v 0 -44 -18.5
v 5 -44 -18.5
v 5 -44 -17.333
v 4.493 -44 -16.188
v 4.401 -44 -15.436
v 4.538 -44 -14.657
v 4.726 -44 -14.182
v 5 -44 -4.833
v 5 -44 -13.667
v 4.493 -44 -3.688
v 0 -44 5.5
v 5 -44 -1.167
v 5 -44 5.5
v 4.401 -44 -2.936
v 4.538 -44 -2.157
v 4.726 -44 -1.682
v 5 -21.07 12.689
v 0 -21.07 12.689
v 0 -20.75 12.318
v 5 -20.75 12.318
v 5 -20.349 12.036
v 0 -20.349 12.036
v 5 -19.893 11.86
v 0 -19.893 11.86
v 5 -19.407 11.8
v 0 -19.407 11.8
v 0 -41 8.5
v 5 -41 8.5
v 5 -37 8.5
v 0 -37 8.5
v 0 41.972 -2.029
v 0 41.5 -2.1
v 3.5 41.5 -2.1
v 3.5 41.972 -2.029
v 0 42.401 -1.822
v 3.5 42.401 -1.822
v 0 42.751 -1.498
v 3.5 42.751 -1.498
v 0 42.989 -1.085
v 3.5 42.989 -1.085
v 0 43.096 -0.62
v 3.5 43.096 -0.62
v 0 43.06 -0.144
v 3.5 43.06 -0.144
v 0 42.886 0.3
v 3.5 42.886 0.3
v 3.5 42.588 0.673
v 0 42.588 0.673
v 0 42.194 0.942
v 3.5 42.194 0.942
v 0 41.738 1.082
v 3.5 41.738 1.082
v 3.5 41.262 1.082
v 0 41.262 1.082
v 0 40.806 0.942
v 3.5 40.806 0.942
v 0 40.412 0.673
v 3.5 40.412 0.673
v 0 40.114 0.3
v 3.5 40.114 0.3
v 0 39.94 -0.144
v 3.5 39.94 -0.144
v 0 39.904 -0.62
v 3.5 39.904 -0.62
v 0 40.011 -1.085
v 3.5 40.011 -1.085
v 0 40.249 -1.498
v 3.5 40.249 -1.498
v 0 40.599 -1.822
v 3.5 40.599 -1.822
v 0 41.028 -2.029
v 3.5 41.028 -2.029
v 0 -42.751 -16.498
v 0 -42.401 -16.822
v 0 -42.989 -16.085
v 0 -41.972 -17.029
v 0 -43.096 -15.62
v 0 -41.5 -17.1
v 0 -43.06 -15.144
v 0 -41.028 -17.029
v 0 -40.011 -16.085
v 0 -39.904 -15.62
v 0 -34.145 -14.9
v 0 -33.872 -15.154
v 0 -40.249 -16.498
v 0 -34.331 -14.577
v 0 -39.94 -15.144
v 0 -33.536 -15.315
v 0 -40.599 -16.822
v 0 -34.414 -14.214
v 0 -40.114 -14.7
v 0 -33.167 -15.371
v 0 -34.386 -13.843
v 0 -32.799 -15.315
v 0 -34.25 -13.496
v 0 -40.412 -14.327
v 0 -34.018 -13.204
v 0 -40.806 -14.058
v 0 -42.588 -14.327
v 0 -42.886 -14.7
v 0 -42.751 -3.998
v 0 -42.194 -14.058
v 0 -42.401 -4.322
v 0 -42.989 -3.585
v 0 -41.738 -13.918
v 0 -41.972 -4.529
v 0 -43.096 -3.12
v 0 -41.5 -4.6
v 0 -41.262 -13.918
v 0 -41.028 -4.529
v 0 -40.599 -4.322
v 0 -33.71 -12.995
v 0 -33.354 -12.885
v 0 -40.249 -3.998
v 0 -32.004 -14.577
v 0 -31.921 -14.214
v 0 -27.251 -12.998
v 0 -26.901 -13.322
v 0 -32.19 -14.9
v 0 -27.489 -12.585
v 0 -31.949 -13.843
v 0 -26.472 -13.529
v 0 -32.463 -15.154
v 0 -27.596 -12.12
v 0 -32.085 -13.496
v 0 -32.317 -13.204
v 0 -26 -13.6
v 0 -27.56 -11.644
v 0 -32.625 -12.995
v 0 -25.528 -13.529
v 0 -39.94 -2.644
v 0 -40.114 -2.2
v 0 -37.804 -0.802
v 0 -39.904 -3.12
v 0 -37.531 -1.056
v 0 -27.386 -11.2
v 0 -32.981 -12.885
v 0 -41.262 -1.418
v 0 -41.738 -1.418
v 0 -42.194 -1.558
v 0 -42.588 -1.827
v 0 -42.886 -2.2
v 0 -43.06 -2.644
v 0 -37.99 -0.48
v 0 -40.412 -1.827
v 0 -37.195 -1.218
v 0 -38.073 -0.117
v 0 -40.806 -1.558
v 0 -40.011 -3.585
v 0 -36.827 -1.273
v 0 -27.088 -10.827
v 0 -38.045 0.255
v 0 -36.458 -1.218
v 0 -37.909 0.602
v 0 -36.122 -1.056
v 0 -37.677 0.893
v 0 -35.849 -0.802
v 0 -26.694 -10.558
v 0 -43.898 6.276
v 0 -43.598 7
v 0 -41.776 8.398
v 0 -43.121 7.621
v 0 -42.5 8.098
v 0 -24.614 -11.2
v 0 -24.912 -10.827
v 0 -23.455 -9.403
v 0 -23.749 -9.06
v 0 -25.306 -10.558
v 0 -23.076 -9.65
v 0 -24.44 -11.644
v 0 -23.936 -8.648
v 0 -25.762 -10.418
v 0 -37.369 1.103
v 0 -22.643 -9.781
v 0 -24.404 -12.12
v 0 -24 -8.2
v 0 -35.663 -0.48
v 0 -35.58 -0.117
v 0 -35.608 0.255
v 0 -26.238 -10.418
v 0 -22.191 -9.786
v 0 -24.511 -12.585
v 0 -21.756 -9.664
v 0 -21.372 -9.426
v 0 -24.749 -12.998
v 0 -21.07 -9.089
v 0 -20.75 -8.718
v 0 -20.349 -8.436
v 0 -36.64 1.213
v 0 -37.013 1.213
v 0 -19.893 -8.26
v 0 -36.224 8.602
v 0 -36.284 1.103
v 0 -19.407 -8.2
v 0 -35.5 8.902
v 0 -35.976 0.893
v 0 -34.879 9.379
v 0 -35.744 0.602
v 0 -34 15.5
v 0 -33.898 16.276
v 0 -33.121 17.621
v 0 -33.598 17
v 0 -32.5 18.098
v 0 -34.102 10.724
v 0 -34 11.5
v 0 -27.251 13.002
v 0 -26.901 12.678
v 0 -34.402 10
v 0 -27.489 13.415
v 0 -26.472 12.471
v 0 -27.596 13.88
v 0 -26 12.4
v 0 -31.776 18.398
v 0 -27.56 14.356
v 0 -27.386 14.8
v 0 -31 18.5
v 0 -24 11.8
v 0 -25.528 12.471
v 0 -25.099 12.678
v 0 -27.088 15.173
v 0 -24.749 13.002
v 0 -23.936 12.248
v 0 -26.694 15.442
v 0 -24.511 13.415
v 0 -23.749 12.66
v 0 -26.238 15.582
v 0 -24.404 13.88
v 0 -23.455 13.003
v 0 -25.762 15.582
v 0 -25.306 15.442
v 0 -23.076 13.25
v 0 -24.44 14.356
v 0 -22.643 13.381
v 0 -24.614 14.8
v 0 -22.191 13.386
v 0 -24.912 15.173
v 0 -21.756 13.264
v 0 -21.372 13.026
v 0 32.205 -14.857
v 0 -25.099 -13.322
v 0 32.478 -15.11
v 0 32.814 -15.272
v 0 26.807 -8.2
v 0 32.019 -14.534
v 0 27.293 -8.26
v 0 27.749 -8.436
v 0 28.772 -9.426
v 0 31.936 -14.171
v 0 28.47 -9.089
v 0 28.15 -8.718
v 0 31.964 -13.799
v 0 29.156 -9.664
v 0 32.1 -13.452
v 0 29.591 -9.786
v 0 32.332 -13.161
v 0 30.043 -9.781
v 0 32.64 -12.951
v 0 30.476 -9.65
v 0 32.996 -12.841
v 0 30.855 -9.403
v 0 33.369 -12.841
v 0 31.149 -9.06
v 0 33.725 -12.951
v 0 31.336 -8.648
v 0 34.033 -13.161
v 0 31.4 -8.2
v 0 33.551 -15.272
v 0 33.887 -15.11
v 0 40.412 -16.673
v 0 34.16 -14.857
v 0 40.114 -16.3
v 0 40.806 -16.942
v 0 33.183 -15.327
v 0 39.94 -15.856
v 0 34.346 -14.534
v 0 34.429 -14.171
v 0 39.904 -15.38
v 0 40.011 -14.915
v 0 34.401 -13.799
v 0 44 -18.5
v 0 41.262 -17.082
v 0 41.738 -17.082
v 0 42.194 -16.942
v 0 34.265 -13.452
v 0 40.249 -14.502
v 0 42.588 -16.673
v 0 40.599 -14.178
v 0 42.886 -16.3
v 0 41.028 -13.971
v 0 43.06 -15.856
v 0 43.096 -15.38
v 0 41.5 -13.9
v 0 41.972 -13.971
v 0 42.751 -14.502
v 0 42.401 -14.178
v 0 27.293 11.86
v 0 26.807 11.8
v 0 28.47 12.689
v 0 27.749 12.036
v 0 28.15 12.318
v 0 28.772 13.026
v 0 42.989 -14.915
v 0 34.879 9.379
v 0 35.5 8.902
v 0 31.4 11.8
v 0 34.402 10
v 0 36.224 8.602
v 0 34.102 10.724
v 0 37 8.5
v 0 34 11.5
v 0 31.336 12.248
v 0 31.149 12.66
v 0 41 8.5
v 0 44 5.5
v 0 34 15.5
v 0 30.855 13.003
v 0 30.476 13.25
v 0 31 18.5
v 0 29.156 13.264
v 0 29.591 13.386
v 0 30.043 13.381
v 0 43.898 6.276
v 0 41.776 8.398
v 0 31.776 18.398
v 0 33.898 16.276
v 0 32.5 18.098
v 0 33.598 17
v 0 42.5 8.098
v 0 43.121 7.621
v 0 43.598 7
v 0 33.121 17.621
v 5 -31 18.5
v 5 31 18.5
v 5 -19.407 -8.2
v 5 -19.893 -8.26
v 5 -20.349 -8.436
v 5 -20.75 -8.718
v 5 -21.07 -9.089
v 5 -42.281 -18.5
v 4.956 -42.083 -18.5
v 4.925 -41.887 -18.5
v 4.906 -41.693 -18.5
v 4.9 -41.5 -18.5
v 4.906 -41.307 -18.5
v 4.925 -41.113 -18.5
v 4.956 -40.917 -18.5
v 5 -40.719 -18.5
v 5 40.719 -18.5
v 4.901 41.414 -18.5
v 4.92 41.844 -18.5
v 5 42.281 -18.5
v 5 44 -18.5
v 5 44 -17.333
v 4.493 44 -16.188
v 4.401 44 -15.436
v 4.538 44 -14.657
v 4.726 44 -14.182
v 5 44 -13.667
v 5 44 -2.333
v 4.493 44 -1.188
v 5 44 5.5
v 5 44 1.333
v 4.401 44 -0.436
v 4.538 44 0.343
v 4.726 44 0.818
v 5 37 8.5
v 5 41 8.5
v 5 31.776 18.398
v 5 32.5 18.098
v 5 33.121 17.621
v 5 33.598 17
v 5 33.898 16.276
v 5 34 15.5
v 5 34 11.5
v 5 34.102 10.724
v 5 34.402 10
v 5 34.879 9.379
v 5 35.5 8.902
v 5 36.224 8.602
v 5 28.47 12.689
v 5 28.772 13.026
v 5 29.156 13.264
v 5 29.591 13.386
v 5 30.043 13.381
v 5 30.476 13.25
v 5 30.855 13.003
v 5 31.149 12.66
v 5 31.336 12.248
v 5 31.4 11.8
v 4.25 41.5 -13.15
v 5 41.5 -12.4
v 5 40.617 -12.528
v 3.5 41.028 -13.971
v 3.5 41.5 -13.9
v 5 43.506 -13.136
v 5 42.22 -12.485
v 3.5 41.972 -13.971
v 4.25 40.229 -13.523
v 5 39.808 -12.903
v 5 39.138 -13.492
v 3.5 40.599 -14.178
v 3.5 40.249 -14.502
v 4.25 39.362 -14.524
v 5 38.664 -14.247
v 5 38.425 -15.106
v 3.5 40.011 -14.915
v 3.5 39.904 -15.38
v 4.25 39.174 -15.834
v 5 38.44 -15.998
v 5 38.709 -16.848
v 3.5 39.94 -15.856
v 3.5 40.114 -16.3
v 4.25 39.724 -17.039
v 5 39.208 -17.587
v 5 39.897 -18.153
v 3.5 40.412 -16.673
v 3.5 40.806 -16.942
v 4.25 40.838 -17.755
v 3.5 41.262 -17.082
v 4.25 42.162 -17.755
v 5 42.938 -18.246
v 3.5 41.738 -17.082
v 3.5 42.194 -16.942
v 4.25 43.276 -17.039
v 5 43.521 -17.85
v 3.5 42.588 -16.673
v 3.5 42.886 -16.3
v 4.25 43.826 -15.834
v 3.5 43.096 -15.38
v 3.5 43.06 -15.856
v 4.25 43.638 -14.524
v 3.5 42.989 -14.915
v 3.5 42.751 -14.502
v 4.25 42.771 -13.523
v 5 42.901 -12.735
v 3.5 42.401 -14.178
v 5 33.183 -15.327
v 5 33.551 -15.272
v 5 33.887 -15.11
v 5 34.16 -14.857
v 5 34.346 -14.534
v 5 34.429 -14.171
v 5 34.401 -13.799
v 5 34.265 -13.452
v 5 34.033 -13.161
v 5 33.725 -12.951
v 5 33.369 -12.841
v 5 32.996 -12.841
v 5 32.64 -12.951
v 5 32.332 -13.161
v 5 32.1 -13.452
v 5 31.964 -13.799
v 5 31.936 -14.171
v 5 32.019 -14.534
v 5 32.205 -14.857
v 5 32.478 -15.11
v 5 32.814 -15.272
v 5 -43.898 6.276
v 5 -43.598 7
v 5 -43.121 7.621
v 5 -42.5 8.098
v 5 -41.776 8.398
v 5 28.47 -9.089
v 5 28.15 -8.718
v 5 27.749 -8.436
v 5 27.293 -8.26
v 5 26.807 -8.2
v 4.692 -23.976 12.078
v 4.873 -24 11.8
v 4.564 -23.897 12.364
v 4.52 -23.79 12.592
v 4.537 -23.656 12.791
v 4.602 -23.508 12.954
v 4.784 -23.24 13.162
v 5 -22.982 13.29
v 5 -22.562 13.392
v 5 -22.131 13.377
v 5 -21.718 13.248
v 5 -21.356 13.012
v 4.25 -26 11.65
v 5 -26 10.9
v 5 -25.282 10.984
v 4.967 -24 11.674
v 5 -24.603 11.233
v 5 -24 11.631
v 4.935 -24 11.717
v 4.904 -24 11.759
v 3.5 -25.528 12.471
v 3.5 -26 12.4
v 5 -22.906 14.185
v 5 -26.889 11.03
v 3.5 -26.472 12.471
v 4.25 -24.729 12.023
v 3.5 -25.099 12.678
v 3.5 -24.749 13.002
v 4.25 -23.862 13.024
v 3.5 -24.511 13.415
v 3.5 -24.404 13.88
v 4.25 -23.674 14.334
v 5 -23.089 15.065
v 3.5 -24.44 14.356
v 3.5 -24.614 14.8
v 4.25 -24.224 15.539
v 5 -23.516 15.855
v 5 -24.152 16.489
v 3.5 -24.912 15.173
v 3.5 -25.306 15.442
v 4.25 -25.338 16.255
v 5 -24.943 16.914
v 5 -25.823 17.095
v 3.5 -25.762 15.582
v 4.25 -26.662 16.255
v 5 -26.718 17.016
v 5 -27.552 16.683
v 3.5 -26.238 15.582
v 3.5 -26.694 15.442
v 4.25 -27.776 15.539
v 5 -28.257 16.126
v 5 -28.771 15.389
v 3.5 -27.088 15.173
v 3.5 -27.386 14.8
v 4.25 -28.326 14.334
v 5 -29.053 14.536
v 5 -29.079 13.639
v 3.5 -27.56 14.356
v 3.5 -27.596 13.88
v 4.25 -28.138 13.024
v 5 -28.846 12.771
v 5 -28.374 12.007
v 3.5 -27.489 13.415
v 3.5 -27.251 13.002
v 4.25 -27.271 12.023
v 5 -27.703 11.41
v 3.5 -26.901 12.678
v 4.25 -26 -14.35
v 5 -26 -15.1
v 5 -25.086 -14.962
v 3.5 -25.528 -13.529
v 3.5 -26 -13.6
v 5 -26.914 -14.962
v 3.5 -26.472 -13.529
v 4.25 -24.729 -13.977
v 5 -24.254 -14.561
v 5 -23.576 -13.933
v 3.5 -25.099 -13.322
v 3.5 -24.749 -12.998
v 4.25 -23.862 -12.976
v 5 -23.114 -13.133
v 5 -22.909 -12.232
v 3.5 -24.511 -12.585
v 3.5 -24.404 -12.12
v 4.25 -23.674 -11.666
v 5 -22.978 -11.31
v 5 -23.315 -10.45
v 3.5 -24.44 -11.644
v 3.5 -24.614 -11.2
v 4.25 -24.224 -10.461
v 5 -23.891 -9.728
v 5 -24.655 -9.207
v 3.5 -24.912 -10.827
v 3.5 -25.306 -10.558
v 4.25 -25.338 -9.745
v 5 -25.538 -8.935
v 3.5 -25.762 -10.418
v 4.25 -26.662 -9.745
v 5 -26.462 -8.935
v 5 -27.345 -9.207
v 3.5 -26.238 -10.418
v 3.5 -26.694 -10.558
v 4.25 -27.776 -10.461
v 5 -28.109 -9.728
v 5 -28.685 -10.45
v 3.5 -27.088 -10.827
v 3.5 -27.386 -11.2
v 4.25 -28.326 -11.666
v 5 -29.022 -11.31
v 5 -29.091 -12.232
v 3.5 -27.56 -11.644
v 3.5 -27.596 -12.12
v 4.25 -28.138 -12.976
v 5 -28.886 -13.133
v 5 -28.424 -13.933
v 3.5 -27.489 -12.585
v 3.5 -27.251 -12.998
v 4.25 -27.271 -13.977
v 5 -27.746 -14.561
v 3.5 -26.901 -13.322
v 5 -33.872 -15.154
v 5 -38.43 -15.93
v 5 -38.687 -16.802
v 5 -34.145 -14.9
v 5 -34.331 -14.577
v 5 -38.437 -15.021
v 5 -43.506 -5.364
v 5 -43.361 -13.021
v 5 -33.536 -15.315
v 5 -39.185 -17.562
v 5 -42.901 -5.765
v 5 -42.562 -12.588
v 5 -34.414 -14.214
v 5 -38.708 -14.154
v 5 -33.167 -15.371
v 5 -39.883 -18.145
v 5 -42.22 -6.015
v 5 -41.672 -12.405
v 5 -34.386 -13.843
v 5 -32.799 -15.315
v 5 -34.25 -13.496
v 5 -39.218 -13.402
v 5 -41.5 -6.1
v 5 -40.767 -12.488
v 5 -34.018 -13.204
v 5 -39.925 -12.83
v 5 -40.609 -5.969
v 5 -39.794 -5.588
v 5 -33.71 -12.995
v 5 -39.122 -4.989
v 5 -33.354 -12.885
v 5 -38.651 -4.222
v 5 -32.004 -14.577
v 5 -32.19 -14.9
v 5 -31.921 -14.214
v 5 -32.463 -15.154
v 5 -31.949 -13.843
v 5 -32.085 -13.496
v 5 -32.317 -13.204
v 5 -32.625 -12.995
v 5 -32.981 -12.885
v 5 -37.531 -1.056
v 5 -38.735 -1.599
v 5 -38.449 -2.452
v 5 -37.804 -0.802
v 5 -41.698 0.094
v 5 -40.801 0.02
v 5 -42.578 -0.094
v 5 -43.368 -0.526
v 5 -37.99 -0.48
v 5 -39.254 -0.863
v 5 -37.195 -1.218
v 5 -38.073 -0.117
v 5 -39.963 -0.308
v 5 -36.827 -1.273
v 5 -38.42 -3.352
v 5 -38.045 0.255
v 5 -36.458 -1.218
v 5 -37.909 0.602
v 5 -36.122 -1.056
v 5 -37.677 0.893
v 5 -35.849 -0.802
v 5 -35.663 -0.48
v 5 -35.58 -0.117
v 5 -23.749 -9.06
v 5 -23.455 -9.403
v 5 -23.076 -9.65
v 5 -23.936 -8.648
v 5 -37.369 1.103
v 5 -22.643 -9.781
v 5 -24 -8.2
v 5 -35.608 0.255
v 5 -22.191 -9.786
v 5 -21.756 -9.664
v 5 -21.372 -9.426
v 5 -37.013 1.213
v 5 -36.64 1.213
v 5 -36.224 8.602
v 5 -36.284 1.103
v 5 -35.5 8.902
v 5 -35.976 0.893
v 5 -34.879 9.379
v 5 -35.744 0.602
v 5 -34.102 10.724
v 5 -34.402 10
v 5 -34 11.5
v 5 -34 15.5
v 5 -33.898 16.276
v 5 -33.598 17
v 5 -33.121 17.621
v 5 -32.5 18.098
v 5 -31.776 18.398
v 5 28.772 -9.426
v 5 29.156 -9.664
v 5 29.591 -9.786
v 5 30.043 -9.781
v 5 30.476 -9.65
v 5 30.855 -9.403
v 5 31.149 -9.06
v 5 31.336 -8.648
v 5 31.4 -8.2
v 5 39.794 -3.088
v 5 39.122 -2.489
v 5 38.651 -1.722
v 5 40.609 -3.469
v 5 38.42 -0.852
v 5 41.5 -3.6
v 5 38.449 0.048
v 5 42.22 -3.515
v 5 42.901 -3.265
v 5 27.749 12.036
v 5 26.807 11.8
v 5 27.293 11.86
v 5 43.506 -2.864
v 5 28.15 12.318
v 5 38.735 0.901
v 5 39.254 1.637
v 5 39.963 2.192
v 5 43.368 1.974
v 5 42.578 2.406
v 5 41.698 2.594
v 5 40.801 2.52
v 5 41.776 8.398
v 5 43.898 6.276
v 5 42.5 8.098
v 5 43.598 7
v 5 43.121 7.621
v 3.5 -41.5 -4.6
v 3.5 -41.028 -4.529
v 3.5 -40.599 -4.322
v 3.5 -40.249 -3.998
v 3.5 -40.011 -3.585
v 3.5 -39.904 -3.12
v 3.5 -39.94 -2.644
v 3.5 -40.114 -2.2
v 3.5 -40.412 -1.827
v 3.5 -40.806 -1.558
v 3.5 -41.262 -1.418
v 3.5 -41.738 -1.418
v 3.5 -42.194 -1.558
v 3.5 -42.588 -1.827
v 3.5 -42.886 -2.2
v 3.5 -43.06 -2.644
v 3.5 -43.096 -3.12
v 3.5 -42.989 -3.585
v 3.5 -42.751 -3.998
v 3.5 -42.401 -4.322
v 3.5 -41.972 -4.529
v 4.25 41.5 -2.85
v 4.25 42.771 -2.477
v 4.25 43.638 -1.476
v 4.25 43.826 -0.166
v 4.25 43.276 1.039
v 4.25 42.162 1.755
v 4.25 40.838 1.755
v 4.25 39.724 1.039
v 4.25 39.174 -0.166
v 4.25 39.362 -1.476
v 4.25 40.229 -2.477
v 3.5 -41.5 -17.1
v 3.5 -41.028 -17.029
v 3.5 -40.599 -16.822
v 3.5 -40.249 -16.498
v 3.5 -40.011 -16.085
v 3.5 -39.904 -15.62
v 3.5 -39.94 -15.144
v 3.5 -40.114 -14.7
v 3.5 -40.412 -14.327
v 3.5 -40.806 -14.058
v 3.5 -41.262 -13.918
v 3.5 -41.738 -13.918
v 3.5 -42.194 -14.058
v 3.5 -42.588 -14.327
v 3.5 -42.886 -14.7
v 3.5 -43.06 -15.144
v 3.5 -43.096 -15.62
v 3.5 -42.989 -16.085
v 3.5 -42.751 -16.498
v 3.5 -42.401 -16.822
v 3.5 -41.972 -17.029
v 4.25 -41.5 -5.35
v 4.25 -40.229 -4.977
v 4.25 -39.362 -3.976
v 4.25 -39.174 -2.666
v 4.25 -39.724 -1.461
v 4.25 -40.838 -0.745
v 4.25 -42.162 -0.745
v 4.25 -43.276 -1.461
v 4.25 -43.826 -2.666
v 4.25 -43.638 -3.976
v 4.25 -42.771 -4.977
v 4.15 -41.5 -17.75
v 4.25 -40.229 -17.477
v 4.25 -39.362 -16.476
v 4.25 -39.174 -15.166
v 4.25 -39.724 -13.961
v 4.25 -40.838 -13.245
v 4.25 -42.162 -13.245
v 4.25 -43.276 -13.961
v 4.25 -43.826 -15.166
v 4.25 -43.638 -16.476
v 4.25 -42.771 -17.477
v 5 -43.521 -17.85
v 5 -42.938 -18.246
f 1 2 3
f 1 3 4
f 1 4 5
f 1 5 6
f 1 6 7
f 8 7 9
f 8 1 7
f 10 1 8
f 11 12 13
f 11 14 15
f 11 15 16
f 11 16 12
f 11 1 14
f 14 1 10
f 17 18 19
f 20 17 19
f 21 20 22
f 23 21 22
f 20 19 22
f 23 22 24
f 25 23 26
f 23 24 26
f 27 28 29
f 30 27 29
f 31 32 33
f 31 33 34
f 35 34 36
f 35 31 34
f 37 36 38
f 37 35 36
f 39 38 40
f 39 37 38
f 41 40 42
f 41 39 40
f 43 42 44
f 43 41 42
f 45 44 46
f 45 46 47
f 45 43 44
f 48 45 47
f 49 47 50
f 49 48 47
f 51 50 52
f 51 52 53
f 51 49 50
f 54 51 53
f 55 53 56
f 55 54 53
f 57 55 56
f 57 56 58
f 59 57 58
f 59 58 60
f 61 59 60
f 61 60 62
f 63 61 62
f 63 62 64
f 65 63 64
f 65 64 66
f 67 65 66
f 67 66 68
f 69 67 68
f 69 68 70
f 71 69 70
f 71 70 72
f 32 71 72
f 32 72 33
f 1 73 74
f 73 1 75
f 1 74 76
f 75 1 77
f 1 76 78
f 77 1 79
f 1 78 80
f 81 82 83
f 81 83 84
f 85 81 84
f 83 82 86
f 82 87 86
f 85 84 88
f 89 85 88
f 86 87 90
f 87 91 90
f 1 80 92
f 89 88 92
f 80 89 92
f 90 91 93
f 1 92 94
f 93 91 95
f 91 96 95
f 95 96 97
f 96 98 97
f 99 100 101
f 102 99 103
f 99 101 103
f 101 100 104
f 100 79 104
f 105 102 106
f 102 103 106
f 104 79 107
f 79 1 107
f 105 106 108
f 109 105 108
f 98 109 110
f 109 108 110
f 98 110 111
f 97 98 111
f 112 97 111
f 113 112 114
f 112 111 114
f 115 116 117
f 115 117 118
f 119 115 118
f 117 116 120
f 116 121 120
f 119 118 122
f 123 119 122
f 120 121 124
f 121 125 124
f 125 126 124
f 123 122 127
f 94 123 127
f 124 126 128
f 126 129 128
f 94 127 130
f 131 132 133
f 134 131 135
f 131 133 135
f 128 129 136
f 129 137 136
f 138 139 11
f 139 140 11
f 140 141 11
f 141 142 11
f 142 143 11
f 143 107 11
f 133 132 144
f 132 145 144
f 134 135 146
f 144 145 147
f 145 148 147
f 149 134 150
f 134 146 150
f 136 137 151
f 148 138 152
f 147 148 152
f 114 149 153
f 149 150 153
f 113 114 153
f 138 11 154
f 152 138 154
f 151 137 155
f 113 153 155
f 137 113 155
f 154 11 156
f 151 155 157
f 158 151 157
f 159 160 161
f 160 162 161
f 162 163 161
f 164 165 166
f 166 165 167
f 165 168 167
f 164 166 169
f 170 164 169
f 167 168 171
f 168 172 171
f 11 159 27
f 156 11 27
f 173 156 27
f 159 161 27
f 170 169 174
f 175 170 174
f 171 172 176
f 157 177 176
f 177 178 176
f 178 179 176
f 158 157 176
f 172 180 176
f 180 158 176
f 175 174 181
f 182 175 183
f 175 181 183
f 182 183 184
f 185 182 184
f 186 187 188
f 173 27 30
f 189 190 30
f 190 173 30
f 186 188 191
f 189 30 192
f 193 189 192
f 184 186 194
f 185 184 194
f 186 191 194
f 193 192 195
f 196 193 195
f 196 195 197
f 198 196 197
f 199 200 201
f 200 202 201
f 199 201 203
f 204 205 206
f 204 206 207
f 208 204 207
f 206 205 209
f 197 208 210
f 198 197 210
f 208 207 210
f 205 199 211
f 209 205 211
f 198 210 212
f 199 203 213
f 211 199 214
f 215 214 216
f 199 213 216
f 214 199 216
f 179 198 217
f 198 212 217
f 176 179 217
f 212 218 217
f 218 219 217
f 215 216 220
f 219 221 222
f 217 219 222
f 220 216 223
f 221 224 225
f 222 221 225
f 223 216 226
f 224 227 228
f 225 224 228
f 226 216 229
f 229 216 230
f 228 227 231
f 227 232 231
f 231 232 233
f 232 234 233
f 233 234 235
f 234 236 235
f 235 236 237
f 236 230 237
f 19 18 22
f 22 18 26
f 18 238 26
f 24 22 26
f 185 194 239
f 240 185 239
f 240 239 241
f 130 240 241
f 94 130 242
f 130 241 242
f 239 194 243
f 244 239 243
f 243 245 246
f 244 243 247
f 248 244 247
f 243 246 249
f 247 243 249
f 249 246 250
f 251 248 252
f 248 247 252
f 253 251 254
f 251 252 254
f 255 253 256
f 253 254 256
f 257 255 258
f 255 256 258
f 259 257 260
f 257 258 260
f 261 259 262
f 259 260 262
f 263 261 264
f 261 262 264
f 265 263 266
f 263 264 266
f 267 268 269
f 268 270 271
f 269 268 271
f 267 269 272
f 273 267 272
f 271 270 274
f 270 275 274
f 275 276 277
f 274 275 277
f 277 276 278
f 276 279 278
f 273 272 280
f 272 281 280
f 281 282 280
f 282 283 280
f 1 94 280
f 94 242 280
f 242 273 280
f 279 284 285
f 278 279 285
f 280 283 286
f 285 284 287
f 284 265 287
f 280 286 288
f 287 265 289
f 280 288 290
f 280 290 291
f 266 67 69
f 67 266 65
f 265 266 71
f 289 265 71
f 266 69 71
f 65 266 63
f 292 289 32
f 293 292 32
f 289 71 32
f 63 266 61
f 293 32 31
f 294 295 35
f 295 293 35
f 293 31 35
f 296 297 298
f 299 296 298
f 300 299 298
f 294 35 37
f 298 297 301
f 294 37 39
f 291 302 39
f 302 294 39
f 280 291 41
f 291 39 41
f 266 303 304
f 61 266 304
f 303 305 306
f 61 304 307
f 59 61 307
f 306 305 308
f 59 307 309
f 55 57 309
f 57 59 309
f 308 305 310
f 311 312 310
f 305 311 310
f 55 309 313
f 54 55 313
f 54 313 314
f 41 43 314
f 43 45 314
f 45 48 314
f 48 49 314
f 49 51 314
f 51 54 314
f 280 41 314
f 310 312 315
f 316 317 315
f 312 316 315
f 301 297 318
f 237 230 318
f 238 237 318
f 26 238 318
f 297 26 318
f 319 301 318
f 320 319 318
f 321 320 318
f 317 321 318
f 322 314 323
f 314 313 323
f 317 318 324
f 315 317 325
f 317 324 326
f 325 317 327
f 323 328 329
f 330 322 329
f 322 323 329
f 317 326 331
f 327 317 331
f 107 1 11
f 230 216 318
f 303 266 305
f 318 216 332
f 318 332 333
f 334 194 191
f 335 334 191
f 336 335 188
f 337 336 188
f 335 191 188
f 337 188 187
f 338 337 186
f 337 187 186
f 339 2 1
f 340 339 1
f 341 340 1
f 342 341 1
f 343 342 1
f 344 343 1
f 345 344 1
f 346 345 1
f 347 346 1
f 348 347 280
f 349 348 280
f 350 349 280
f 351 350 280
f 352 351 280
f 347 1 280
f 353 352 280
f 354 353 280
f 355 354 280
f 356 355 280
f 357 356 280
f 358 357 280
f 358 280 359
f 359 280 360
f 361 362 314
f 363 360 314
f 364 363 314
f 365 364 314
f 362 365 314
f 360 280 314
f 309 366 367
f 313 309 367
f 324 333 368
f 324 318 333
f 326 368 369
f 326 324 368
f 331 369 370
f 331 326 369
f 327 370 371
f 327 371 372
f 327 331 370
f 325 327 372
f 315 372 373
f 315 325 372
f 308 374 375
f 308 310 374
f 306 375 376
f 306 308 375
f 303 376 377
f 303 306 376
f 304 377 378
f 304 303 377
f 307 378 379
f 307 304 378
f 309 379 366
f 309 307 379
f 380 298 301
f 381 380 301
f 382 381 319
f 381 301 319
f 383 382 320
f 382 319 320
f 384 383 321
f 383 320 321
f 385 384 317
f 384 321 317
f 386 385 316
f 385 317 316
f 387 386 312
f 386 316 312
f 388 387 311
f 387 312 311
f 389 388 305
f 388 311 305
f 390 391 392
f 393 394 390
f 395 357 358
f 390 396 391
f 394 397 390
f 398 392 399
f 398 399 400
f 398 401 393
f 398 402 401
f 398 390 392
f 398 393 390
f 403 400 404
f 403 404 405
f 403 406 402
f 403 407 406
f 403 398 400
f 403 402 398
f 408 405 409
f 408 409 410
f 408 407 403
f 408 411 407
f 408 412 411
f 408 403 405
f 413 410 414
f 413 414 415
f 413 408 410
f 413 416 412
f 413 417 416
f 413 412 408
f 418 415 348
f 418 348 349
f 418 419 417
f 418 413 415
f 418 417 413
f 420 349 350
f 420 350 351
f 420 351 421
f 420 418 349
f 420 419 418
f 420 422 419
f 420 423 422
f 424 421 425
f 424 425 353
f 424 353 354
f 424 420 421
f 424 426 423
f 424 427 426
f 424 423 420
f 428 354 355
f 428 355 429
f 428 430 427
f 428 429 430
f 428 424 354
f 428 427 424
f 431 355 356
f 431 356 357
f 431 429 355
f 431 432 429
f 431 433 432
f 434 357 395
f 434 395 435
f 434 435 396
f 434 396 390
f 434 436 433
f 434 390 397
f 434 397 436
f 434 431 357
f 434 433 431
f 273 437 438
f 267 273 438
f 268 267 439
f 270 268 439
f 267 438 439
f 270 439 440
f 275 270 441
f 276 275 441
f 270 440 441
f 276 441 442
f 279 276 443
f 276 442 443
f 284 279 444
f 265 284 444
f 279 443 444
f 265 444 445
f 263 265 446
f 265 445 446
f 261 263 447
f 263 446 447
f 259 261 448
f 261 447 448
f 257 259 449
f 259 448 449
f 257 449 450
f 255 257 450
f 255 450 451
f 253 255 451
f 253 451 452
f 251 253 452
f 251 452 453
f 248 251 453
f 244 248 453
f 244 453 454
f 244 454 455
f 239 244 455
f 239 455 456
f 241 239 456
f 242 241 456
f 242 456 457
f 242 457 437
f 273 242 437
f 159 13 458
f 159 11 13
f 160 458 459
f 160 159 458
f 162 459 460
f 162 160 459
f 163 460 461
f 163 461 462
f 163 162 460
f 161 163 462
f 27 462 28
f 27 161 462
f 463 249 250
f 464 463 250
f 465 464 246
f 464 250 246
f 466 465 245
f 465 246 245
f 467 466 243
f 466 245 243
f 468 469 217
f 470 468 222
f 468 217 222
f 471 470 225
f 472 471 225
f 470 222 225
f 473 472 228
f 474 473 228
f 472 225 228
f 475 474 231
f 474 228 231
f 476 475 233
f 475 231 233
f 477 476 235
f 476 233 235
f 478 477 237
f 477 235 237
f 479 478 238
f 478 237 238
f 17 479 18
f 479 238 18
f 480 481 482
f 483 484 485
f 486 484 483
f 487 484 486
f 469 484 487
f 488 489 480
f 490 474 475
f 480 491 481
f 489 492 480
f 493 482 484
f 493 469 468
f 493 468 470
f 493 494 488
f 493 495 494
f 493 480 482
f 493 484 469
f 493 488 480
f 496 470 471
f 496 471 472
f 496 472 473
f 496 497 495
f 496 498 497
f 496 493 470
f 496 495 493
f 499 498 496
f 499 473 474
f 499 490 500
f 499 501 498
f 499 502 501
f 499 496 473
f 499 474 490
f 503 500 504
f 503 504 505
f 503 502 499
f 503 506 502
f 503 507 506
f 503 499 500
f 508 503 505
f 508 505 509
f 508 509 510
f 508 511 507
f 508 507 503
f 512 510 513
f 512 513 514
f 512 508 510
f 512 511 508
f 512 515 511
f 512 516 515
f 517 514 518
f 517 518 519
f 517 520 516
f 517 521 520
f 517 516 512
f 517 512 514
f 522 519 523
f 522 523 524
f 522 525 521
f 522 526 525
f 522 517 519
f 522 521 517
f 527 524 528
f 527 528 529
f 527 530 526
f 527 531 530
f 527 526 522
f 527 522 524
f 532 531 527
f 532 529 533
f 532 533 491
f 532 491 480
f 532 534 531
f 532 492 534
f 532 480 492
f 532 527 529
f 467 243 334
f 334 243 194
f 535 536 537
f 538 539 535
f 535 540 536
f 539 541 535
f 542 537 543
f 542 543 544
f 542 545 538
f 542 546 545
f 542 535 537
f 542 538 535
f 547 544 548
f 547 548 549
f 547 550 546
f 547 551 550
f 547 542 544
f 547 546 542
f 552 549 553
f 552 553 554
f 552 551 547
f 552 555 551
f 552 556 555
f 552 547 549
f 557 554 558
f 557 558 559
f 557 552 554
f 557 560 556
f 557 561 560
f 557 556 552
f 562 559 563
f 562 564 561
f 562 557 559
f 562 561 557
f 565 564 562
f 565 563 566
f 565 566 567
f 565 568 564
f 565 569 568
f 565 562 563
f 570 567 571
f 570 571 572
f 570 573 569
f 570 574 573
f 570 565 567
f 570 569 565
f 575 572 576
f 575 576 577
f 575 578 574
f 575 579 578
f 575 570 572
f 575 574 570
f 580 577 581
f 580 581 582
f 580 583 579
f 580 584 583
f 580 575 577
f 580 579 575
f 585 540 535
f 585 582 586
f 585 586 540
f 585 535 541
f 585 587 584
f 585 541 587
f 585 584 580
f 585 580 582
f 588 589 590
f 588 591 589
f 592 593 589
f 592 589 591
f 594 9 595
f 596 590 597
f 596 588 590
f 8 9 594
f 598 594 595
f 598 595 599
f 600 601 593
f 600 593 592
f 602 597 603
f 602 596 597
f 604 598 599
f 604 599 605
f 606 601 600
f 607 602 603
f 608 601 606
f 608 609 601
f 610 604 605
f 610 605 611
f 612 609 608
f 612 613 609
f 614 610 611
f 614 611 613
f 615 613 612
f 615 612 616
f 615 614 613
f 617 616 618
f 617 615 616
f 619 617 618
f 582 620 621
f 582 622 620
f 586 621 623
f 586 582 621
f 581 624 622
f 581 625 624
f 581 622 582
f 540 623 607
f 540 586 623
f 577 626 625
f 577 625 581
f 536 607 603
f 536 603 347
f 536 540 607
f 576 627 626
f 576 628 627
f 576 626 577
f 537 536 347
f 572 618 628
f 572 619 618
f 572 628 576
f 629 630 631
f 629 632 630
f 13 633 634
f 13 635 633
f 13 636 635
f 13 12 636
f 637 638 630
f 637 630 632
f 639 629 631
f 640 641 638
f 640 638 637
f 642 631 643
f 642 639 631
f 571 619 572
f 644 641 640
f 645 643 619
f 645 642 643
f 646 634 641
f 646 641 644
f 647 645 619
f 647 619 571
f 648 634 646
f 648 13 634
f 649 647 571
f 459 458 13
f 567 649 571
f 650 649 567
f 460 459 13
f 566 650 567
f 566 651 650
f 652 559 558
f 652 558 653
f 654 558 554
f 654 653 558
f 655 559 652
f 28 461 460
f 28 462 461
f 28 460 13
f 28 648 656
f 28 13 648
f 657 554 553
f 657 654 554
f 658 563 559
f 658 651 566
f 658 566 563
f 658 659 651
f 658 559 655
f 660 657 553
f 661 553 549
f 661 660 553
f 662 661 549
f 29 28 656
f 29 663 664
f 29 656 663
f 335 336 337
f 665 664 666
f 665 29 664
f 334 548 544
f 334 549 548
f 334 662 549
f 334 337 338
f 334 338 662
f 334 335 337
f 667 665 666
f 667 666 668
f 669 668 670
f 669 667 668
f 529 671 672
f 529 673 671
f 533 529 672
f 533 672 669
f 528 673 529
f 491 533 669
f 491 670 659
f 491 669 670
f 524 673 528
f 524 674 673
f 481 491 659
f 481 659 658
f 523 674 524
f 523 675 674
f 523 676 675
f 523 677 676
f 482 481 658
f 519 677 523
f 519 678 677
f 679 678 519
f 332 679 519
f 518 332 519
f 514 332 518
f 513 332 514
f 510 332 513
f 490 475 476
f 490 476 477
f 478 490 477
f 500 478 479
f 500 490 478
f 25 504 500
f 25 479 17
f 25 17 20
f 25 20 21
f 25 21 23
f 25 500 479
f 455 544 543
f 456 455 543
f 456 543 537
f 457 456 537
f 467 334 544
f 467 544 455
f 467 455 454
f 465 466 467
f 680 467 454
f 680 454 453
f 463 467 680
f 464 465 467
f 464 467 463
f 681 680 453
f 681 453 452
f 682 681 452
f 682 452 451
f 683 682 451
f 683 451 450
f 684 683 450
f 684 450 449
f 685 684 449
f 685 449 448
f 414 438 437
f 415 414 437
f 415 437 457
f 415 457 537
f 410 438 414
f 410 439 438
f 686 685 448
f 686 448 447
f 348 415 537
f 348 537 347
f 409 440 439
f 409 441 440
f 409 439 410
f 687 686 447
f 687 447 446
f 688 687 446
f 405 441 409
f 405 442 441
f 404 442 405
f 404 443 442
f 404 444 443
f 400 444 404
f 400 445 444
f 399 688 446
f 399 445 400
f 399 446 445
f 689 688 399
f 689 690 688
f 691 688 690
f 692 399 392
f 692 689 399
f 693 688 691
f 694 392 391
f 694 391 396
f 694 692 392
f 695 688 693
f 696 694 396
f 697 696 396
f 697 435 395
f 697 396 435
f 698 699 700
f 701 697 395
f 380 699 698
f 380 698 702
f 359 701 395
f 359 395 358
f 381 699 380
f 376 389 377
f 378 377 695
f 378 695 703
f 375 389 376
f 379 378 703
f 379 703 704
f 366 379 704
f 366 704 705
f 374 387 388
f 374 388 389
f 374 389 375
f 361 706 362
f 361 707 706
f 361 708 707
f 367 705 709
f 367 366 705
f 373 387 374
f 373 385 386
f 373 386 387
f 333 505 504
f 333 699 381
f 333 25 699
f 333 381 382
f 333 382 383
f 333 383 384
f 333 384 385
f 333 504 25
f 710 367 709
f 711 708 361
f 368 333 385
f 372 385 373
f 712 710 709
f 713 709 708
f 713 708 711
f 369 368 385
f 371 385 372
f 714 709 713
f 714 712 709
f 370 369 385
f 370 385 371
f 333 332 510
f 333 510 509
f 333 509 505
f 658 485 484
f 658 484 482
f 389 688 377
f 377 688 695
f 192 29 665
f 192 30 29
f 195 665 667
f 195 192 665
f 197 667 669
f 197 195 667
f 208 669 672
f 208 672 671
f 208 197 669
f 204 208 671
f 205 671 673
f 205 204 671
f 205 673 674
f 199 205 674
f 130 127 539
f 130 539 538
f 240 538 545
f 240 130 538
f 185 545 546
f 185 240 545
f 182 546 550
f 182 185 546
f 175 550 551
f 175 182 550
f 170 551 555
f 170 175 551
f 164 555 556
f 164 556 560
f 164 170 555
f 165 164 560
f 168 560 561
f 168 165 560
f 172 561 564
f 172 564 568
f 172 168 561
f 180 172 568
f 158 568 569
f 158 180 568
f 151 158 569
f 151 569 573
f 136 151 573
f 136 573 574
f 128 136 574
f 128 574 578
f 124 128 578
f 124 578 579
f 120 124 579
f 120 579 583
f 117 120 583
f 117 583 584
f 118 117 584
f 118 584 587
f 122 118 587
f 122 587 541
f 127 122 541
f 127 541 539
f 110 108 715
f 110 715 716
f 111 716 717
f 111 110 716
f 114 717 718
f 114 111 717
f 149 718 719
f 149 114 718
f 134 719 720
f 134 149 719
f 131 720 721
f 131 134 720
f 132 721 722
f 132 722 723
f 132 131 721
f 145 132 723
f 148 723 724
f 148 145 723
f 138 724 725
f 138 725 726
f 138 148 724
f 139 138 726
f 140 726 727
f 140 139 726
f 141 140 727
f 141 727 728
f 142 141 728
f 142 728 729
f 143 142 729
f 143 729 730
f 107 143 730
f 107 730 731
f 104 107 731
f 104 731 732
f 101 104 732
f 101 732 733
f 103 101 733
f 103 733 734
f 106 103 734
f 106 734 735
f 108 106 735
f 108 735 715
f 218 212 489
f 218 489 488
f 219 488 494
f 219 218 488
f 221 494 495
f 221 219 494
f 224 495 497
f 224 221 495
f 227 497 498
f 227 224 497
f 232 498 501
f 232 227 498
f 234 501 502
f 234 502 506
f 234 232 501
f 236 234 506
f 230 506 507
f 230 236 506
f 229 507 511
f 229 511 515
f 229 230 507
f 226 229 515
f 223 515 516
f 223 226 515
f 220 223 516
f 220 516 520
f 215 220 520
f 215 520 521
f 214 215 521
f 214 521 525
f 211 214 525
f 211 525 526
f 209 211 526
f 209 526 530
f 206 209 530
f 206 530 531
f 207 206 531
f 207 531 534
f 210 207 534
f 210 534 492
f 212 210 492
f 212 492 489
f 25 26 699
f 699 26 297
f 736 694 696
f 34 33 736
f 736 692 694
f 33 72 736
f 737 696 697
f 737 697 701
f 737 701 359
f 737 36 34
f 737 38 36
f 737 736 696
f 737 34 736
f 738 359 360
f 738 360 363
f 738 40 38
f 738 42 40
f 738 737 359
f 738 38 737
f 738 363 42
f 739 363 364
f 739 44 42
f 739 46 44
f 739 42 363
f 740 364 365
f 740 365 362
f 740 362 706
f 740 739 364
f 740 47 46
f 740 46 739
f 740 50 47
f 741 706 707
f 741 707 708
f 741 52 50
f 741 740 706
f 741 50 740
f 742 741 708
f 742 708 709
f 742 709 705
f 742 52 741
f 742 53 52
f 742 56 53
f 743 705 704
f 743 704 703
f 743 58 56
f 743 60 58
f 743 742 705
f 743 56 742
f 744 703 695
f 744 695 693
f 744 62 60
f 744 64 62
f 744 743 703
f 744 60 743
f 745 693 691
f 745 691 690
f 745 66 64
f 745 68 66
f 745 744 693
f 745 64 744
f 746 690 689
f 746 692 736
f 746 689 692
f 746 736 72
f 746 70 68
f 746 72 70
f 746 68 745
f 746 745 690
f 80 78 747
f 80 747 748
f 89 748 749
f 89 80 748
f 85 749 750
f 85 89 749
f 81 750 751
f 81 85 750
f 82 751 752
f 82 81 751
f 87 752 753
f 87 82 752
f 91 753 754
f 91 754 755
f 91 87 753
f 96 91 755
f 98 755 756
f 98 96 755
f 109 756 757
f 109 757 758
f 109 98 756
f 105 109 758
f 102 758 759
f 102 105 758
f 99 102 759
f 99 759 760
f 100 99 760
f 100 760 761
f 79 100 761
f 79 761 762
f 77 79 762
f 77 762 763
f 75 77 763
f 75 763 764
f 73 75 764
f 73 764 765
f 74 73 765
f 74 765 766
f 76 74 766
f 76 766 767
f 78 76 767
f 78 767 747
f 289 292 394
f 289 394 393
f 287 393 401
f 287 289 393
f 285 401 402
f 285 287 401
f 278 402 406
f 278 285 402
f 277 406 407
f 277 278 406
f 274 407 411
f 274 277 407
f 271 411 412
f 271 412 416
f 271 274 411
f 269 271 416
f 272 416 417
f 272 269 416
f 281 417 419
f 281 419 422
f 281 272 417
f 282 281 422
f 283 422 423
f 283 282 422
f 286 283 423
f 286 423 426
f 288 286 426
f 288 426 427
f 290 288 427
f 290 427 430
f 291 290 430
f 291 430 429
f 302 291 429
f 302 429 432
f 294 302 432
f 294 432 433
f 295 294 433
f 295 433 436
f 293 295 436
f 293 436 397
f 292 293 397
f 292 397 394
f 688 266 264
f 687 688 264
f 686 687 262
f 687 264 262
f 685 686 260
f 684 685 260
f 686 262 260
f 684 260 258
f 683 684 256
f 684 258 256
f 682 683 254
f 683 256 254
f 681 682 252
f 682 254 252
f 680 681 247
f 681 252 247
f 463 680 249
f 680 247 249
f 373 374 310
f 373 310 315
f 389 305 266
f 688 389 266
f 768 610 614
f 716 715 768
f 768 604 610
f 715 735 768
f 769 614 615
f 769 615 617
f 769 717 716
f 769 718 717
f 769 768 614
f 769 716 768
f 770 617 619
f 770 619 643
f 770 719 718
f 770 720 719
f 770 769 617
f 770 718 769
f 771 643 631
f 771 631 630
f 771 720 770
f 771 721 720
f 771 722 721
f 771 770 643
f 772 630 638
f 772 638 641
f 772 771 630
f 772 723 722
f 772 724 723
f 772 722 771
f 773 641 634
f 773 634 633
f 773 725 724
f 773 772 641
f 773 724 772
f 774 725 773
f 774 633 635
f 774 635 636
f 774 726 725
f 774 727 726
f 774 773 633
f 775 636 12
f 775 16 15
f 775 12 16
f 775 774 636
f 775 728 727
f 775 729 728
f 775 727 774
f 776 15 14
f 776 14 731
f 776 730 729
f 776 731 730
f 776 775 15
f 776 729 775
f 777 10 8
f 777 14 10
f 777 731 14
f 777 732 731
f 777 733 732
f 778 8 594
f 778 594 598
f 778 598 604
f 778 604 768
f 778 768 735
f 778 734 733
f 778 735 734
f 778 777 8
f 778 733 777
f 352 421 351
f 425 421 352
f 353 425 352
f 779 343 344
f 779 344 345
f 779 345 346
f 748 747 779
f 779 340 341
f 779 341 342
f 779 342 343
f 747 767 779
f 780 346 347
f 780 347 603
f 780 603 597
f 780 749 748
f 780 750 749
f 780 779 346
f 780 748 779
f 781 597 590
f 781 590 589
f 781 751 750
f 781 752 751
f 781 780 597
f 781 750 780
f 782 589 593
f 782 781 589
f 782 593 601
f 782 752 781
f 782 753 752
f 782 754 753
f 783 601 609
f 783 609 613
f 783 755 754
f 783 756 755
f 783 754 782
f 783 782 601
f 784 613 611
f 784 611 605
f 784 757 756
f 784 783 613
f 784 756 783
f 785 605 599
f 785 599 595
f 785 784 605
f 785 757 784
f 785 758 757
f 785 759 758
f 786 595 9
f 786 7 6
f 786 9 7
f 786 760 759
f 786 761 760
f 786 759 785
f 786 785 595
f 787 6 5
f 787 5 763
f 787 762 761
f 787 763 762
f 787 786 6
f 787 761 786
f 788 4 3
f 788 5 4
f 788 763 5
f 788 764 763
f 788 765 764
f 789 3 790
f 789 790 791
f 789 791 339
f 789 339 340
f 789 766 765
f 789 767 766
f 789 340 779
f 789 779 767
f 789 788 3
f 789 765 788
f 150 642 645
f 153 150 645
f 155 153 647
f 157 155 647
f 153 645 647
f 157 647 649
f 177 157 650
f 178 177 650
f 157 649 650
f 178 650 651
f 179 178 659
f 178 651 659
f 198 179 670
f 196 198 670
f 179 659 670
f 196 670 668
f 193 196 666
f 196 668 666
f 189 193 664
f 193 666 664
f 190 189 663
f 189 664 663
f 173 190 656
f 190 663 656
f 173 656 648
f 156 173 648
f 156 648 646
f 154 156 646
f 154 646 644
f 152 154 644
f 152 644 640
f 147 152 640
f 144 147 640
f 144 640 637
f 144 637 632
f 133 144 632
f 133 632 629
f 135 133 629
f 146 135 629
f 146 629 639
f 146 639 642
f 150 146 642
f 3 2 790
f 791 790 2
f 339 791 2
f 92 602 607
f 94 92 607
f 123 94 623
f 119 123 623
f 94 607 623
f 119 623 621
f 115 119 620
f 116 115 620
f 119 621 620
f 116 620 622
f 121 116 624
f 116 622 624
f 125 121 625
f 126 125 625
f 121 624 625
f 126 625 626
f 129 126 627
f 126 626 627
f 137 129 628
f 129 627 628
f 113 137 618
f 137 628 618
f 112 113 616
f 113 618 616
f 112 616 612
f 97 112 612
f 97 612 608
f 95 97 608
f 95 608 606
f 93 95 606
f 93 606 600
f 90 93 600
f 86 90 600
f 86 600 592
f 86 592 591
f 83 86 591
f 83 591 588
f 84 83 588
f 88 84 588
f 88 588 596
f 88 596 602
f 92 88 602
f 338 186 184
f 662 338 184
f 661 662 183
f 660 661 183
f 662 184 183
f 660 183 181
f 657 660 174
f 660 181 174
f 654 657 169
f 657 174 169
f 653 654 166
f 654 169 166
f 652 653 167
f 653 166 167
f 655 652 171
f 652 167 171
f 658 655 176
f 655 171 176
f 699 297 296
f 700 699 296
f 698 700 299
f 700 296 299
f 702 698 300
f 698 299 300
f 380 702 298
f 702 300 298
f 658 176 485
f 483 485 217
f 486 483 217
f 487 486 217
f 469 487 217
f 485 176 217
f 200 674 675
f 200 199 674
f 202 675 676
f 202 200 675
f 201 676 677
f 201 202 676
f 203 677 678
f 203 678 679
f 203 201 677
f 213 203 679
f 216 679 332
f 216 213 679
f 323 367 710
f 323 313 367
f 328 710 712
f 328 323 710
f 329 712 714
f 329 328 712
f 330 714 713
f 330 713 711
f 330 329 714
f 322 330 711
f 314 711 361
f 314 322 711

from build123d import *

# Parameters (mm, degrees)
SKETCH1_W           = 88
SKETCH1_H           = 37
SKETCH1_R           = 1.6
BOSS_EXTRUDE1_DEPTH = 5
FILLET1_R           = 5
CHAMFER2_SIZE       = 1.5
SKETCH2_R           = 1.25
CUT_EXTRUDE1_DEPTH  = 10
SKETCH3_W           = 10
SKETCH3_H           = 10
CUT_EXTRUDE2_DEPTH  = 10
FILLET2_R           = 3


with BuildPart() as part:
    # Sketch1 → Boss-Extrude1 (new body)
    with BuildSketch(Plane.YZ):
        Rectangle(SKETCH1_W, SKETCH1_H)
        with Locations(Location((-41.5, -15.5, 0), (0, 0, 270))):
            Circle(SKETCH1_R, mode=Mode.SUBTRACT)
        with Locations(Location((-41.5, -3, 0), (0, 0, 270))):
            Circle(SKETCH1_R, mode=Mode.SUBTRACT)
        with Locations(Location((41.5, -15.5, 0), (0, 0, 90))):
            Circle(SKETCH1_R, mode=Mode.SUBTRACT)
        with Locations(Location((-26, 14, 0), (0, 0, 270))):
            Circle(SKETCH1_R, mode=Mode.SUBTRACT)
        with Locations(Location((-26, -12, 0), (0, 0, 270))):
            Circle(SKETCH1_R, mode=Mode.SUBTRACT)
        with Locations(Location((41.5, -0.5, 0), (0, 0, 270))):
            Circle(SKETCH1_R, mode=Mode.SUBTRACT)
        with BuildLine():
            Line((-24, -8.2), (-24, 11.8))
            ThreePointArc((-24, 11.8), (-22.86444197, 13.331108636), (-21.069632929, 12.688888889))
            ThreePointArc((-21.069632929, 12.688888889), (-20.349483132, 12.036165793), (-19.406674091, 11.8))
            Line((-19.406674091, 11.8), (26.806674091, 11.8))
            ThreePointArc((26.806674091, 11.8), (27.749483132, 12.036165793), (28.469632929, 12.688888889))
            ThreePointArc((28.469632929, 12.688888889), (30.26444197, 13.331108636), (31.4, 11.8))
            Line((31.4, 11.8), (31.4, -8.2))
            ThreePointArc((31.4, -8.2), (30.26444197, -9.731108636), (28.469632929, -9.088888889))
            ThreePointArc((28.469632929, -9.088888889), (27.749483132, -8.436165793), (26.806674091, -8.2))
            Line((26.806674091, -8.2), (-19.406674091, -8.2))
            ThreePointArc((-19.406674091, -8.2), (-20.349483132, -8.436165793), (-21.069632929, -9.088888889))
            ThreePointArc((-21.069632929, -9.088888889), (-22.86444197, -9.731108636), (-24, -8.2))
        make_face(mode=Mode.SUBTRACT)
    extrude(amount=BOSS_EXTRUDE1_DEPTH)

    # Fillet1
    fillet1_edges = [part.edges().sort_by_distance(p)[0] for p in [
        (2.5, -44, 18.5),
        (2.5, 44, 18.5),
    ]]
    fillet(fillet1_edges, radius=FILLET1_R)

    # Chamfer2
    # the kernel refuses this chamfer: 1.5 mm, written as the material it takes off along each edge
    with BuildSketch(Plane(origin=(5, -41.5, -15.5), x_dir=(0, 0, -1), z_dir=(0, -1, 0))) as chamfer2_piece_1:
        Polygon((1.6 + CHAMFER2_SIZE, 0), (1.6, -CHAMFER2_SIZE), (1.6, 0), align=None)
    revolve(axis=Axis((5, -41.5, -15.5), (1, 0, 0)), mode=Mode.SUBTRACT)
    with BuildSketch(Plane(origin=(5, -41.5, -3), x_dir=(0, 0, -1), z_dir=(0, -1, 0))) as chamfer2_piece_2:
        Polygon((1.6 + CHAMFER2_SIZE, 0), (1.6, -CHAMFER2_SIZE), (1.6, 0), align=None)
    revolve(axis=Axis((5, -41.5, -3), (1, 0, 0)), mode=Mode.SUBTRACT)
    with BuildSketch(Plane(origin=(5, 41.5, -0.5), x_dir=(0, 0, -1), z_dir=(0, -1, 0))) as chamfer2_piece_3:
        Polygon((1.6 + CHAMFER2_SIZE, 0), (1.6, -CHAMFER2_SIZE), (1.6, 0), align=None)
    revolve(axis=Axis((5, 41.5, -0.5), (1, 0, 0)), mode=Mode.SUBTRACT)
    with BuildSketch(Plane(origin=(5, 41.5, -15.5), x_dir=(0, 0, 1), z_dir=(0, 1, 0))) as chamfer2_piece_4:
        Polygon((1.6 + CHAMFER2_SIZE, 0), (1.6, -CHAMFER2_SIZE), (1.6, 0), align=None)
    revolve(axis=Axis((5, 41.5, -15.5), (1, 0, 0)), mode=Mode.SUBTRACT)
    with BuildSketch(Plane(origin=(5, -26, 14), x_dir=(0, 0, -1), z_dir=(0, -1, 0))) as chamfer2_piece_5:
        Polygon((1.6 + CHAMFER2_SIZE, 0), (1.6, -CHAMFER2_SIZE), (1.6, 0), align=None)
    revolve(axis=Axis((5, -26, 14), (1, 0, 0)), mode=Mode.SUBTRACT)
    with BuildSketch(Plane(origin=(5, -26, -12), x_dir=(0, 0, -1), z_dir=(0, -1, 0))) as chamfer2_piece_6:
        Polygon((1.6 + CHAMFER2_SIZE, 0), (1.6, -CHAMFER2_SIZE), (1.6, 0), align=None)
    revolve(axis=Axis((5, -26, -12), (1, 0, 0)), mode=Mode.SUBTRACT)

    # Sketch2 → Cut-Extrude1 (cut)
    with BuildSketch(Plane.YZ.offset(5)):
        with Locations(Location((-36.826603685, -0.023130638, 0), (0, 0, 270))):
            Circle(SKETCH2_R)
        with Locations(Location((-33.167413509, -14.120748425, 0), (0, 0, 270))):
            Circle(SKETCH2_R)
        with Locations(Location((33.182572395, -14.077498807, 0), (0, 0, 270))):
            Circle(SKETCH2_R)
    extrude(amount=-CUT_EXTRUDE1_DEPTH, mode=Mode.SUBTRACT)

    # Sketch3 → Cut-Extrude2 (cut)
    with BuildSketch(Plane.YZ.offset(5)):
        with Locations((-39, 13.5)):
            Rectangle(SKETCH3_W, SKETCH3_H)
        with Locations((39, 13.5)):
            Rectangle(SKETCH3_W, SKETCH3_H)
    extrude(amount=-CUT_EXTRUDE2_DEPTH, mode=Mode.SUBTRACT)

    # Fillet2
    fillet2_edges = [part.edges().sort_by_distance(p)[0] for p in [
        (2.5, -34, 18.5),
        (2.5, -34, 8.5),
        (2.5, -44, 8.5),
        (2.5, 44, 8.5),
        (2.5, 34, 8.5),
        (2.5, 34, 18.5),
    ]]
    fillet(fillet2_edges, radius=FILLET2_R)


solid = part.part
